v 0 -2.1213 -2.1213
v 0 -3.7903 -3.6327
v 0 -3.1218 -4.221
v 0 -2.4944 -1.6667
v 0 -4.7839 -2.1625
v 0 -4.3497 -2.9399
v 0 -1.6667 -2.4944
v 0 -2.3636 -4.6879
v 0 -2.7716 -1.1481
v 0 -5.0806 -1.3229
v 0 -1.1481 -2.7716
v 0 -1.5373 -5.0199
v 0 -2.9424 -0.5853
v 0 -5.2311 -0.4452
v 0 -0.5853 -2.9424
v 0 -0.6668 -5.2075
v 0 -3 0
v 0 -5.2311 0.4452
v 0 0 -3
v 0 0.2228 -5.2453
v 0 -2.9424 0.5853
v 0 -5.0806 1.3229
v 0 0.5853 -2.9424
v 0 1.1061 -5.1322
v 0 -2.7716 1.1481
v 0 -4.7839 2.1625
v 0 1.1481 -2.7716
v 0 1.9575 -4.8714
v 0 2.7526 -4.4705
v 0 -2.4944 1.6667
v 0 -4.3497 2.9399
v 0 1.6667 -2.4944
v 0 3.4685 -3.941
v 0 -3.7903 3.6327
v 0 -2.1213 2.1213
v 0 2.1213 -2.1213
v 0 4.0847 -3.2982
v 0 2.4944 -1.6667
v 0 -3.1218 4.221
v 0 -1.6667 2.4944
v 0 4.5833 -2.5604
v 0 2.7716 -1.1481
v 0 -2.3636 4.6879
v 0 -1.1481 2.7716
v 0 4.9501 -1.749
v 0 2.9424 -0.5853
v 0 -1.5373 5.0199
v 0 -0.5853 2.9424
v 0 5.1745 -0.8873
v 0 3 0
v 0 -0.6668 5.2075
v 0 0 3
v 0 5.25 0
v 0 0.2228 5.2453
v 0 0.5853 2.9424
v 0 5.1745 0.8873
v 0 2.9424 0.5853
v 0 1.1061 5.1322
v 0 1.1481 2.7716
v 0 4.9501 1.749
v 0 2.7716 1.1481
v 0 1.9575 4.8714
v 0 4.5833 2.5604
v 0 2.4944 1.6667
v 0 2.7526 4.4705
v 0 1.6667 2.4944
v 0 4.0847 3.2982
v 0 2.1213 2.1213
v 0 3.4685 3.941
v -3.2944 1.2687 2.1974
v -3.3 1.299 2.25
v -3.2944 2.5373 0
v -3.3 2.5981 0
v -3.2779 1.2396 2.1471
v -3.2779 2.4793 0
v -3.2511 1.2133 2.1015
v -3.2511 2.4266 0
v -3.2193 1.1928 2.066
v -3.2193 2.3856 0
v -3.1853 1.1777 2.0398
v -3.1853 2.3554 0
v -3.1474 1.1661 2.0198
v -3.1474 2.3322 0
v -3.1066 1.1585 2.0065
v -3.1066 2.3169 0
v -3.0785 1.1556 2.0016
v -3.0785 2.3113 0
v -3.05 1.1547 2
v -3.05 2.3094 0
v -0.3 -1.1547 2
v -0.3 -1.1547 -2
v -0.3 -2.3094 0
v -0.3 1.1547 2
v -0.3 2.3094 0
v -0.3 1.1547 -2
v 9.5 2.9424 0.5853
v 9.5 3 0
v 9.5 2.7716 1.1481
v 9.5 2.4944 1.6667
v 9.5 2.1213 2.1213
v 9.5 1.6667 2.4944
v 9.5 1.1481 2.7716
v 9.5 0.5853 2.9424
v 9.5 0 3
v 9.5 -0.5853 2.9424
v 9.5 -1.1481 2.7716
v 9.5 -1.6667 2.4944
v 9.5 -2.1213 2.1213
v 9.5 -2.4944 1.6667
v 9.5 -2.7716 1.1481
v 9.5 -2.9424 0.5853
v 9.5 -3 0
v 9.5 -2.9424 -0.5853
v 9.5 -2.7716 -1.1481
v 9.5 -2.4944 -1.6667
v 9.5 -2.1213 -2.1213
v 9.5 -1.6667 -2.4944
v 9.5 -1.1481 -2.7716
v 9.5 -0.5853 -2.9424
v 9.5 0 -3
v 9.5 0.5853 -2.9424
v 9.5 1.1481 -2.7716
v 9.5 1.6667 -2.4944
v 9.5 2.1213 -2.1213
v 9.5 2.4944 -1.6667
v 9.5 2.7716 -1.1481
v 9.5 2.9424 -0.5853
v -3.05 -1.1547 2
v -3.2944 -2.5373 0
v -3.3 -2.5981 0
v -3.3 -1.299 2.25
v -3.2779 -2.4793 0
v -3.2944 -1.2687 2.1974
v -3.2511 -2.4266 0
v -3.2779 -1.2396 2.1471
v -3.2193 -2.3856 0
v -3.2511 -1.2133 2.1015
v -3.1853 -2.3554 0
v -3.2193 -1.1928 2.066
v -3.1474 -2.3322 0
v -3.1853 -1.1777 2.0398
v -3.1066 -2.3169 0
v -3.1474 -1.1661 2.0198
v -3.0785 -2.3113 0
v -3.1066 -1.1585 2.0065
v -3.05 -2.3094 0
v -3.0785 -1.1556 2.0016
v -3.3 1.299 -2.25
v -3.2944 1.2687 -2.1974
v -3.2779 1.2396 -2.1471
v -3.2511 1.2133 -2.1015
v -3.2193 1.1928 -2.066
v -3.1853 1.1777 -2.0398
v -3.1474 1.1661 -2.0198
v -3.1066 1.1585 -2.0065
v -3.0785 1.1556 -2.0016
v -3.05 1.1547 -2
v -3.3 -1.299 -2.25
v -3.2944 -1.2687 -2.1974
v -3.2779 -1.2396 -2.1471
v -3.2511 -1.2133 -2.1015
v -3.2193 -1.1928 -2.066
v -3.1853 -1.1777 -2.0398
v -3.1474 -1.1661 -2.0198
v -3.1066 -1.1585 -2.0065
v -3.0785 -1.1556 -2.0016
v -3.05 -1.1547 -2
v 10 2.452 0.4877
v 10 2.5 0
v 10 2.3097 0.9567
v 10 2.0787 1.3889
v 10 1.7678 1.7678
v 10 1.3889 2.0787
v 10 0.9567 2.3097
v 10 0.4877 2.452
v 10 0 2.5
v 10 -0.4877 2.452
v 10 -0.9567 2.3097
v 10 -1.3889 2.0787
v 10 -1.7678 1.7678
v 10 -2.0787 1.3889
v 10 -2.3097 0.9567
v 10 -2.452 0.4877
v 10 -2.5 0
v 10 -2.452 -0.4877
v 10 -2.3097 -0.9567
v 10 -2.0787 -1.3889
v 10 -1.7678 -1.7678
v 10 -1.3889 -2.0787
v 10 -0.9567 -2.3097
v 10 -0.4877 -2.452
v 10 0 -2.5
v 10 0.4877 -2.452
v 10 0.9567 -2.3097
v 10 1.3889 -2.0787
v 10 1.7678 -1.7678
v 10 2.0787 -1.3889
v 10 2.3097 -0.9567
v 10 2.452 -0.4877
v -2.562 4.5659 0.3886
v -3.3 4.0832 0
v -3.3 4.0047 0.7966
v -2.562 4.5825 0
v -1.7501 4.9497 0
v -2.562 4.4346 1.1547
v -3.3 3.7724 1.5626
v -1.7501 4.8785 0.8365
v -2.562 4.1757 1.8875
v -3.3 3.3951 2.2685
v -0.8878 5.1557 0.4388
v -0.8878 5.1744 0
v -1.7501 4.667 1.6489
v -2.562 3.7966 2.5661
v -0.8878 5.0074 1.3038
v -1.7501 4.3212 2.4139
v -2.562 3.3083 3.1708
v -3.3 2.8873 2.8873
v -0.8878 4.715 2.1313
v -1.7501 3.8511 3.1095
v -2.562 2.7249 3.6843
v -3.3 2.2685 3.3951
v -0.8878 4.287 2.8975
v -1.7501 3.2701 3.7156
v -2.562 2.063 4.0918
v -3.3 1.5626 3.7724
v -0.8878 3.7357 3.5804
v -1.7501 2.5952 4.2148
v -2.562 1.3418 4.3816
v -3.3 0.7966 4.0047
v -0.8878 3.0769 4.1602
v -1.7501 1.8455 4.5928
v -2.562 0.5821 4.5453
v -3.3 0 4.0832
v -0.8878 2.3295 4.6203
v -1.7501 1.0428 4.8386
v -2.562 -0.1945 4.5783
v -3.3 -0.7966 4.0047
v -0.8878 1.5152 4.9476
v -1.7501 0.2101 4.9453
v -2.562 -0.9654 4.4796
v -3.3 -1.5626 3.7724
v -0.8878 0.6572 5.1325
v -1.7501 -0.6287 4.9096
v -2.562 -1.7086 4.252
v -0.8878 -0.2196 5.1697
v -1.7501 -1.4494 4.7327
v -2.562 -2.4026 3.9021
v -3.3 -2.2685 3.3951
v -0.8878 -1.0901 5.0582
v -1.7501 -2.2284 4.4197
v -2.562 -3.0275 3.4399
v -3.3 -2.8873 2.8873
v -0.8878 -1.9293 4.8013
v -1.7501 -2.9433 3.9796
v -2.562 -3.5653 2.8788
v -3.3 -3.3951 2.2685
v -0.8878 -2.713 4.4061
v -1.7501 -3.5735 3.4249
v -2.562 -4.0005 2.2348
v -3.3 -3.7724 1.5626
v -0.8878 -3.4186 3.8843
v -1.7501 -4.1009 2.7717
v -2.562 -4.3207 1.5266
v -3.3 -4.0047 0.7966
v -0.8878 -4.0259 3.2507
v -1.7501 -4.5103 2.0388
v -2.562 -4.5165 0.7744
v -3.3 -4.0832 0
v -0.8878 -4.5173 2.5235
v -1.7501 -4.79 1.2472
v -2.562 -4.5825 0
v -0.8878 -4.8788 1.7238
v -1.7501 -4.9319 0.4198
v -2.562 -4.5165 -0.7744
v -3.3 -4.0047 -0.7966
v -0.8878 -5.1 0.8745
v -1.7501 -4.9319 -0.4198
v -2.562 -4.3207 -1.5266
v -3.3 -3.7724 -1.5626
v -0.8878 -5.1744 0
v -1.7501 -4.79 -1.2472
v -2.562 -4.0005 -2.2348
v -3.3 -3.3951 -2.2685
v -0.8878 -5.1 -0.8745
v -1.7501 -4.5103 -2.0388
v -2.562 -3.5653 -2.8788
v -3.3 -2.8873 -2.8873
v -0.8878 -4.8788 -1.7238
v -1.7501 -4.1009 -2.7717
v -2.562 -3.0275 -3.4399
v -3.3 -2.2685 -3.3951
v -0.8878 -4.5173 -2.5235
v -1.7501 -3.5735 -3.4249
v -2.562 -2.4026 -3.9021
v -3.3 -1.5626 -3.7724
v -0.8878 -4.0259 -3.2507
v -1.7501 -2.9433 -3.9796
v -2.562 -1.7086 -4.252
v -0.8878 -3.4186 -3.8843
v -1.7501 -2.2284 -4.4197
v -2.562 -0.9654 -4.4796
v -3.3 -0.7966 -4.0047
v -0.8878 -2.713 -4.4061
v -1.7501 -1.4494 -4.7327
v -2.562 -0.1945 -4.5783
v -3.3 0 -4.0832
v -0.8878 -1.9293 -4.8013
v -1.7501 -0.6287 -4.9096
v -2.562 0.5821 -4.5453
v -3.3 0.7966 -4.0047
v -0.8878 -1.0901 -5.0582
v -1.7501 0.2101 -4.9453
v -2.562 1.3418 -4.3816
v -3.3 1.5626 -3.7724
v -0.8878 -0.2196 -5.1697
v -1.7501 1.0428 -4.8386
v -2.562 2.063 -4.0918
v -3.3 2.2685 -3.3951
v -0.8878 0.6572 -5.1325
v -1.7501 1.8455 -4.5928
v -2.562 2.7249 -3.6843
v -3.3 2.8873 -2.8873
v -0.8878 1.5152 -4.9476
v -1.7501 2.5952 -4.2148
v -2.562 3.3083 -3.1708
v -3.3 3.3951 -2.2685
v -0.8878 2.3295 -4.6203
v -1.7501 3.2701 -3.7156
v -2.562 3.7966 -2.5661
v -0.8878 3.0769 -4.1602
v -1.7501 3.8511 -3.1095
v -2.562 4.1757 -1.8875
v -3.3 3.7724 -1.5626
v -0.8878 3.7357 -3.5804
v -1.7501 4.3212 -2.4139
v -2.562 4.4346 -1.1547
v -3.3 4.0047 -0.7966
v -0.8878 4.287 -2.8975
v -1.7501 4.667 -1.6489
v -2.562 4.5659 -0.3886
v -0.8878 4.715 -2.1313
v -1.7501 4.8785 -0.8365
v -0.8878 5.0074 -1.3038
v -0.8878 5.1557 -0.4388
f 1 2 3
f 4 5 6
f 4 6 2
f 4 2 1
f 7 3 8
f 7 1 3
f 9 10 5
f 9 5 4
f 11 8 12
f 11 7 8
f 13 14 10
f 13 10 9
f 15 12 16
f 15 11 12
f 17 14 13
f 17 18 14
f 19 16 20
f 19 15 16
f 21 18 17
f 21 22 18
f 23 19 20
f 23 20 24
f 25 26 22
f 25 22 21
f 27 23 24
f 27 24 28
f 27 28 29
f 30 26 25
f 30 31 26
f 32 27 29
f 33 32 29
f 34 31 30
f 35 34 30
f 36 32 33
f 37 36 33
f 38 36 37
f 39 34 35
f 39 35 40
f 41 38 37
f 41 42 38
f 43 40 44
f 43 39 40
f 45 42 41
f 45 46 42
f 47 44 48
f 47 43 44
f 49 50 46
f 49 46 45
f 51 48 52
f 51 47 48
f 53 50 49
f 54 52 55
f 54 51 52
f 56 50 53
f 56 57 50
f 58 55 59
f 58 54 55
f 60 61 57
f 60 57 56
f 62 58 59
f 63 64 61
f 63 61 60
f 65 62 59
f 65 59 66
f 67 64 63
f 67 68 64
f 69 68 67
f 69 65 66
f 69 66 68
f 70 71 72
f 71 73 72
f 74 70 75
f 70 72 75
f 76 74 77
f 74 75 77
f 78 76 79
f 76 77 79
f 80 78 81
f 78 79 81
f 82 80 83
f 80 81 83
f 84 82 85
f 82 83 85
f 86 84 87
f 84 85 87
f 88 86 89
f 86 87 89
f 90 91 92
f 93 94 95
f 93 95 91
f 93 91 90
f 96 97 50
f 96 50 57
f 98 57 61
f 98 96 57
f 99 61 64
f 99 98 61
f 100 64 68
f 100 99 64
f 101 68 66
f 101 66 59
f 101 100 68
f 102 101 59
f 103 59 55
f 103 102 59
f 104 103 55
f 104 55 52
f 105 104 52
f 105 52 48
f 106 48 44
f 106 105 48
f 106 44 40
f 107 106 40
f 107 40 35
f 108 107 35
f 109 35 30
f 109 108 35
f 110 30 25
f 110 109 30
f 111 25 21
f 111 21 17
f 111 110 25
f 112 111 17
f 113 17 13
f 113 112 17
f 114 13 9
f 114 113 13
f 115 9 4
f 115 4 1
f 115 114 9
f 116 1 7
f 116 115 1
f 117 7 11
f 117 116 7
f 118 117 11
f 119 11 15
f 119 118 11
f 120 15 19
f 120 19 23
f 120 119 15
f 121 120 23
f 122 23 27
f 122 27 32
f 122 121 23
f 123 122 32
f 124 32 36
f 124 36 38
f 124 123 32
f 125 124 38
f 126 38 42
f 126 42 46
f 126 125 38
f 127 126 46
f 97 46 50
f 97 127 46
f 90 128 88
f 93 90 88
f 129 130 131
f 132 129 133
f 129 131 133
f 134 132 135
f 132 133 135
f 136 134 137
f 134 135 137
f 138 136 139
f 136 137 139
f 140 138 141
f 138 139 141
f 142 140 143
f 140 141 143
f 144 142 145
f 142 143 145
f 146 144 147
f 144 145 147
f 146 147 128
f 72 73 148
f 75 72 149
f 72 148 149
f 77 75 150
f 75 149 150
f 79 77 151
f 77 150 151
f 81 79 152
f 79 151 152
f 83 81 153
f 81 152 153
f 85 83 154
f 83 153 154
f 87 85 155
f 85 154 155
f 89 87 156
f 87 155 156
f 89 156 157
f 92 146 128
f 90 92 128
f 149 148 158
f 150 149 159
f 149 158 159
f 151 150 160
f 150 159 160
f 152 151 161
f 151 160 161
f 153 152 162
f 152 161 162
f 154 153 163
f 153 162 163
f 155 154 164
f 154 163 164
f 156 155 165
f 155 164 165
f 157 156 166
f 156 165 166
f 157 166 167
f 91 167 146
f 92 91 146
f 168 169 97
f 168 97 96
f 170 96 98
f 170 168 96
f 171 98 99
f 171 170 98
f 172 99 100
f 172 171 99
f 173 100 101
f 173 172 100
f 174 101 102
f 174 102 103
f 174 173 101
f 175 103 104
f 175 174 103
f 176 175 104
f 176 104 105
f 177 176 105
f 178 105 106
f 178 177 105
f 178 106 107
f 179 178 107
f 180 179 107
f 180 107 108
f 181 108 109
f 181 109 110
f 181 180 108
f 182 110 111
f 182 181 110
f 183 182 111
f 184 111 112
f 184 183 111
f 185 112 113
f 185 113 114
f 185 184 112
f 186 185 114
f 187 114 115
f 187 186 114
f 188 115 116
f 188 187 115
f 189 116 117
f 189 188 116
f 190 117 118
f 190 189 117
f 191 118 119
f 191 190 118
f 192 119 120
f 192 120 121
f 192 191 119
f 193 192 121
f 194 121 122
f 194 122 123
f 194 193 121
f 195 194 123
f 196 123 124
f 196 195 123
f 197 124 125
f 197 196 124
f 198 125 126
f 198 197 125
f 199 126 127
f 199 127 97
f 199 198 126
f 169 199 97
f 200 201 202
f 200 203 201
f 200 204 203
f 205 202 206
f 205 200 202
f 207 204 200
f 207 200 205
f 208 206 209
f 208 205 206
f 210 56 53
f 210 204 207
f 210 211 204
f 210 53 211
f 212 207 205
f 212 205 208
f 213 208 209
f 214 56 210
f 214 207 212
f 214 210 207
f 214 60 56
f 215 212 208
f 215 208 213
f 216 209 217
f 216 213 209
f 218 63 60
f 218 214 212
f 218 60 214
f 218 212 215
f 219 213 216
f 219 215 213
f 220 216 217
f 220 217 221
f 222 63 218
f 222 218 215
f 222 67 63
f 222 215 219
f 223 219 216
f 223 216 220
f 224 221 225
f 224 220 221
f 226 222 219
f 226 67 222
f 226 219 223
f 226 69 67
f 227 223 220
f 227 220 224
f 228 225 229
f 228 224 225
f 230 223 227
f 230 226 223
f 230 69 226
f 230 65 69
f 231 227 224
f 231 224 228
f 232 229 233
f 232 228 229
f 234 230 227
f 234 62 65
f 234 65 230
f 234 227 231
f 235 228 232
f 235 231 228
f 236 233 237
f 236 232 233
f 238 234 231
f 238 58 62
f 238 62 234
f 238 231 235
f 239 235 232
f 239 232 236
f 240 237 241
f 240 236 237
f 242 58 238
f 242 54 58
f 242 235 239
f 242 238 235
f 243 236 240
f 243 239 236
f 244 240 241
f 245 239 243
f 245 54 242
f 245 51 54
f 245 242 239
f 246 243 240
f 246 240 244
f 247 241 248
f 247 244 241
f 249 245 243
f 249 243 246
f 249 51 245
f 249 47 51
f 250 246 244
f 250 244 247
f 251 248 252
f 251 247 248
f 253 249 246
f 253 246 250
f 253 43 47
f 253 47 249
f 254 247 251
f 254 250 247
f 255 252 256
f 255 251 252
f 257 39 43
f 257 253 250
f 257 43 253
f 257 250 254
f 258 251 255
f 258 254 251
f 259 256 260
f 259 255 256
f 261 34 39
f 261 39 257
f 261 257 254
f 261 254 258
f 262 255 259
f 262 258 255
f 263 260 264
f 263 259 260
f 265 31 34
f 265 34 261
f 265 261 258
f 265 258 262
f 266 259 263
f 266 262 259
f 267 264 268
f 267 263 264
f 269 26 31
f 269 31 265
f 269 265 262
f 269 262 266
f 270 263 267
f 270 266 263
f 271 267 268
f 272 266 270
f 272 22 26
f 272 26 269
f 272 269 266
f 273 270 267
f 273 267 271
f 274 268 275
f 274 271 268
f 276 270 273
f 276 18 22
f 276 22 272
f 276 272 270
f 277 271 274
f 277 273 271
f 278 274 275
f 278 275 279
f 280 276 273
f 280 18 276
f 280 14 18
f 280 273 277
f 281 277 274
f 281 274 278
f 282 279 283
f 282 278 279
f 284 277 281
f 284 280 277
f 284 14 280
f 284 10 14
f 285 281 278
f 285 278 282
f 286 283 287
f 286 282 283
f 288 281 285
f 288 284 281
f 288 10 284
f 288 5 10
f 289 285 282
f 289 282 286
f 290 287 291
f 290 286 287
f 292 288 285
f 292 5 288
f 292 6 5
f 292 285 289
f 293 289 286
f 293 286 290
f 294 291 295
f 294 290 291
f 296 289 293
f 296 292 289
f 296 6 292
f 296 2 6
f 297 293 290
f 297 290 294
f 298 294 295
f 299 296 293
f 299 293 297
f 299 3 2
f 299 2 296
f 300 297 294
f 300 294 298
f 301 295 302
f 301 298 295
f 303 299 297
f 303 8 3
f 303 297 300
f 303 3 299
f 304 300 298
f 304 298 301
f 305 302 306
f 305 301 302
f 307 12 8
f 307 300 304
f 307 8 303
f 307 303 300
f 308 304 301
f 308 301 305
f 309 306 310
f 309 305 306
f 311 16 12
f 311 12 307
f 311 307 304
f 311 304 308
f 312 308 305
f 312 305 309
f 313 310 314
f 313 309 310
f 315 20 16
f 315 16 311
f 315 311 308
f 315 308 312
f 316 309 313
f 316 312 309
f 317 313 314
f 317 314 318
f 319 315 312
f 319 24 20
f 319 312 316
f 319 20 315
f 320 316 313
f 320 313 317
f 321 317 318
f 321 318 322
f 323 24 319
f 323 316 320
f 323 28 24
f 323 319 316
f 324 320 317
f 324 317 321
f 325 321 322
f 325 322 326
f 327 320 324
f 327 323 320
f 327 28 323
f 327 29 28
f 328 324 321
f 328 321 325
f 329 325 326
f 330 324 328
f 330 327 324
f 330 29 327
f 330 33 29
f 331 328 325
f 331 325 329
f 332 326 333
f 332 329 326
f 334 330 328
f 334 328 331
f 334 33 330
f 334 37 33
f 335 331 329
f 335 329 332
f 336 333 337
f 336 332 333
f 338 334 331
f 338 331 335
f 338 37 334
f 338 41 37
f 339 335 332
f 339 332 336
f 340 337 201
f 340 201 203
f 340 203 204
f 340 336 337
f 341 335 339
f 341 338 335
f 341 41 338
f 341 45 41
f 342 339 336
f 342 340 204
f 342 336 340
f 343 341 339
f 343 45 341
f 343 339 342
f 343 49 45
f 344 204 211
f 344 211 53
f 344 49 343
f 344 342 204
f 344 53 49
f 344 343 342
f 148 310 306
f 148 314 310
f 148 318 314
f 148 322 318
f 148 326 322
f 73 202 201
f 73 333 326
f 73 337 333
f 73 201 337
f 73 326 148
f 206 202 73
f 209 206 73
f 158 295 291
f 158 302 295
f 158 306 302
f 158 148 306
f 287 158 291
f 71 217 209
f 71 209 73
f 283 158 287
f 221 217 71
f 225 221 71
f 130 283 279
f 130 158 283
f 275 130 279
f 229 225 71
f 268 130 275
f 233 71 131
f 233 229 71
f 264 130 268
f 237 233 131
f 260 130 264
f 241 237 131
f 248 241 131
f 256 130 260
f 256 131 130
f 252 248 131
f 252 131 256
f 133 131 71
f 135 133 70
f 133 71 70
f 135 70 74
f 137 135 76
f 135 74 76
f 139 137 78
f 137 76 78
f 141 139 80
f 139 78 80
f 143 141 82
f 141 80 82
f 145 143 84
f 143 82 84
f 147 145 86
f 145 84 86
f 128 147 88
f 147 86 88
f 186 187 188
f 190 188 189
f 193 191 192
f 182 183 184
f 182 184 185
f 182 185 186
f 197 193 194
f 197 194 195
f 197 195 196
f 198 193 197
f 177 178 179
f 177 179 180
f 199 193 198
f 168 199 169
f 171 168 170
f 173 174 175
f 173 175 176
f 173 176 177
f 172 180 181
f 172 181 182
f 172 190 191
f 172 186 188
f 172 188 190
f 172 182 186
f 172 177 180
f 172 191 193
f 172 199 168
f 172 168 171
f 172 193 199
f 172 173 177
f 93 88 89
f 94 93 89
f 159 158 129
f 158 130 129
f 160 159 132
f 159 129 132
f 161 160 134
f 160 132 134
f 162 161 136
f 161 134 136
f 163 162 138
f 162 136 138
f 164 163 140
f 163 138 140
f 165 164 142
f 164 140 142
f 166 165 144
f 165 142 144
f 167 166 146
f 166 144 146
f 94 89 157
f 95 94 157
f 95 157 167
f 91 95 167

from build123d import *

# Parameters (mm, degrees)
CUT_EXTRUDE_1_DEPTH = 3
FILLET_1_R          = 0.25
CHAMFER_1_SIZE      = 0.5


with BuildPart() as part:
    # Эскиз1 → Повернуть1 (revolve)
    with BuildSketch(Plane.XY):
        with BuildLine():
            Line((0, 5.25), (0, 3))
            Line((0, 3), (10, 3))
            Line((10, 3), (10, 0))
            Line((10, 0), (-3.3, 0))
            Line((-3.3, 0), (-3.3, 4.083197277))
            ThreePointArc((-3.3, 4.083197277), (-1.75010204, 4.949711391), (0, 5.25))
        make_face()
    revolve(axis=Axis((-165.749374514, 0, 0), (1, 0, 0)))

    # Эскиз2 → Вырез-Вытянуть1 (cut)
    with BuildSketch(Plane.ZY.offset(3.3)):
        Polygon((0, -2.309401077), (2, -1.154700538), (2, 1.154700538), (0, 2.309401077), (-2, 1.154700538), (-2, -1.154700538), align=None)
    extrude(amount=-CUT_EXTRUDE_1_DEPTH, mode=Mode.SUBTRACT)

    # Скругление1
    fillet_1_edges = [part.edges().sort_by_distance(p)[0] for p in [
        (-3.3, -1.732050808, -1),
        (-3.3, -1.732050808, 1),
        (-3.3, 0, 2),
        (-3.3, 1.732050808, 1),
        (-3.3, 1.732050808, -1),
        (-3.3, 0, -2),
    ]]
    fillet(fillet_1_edges, radius=FILLET_1_R)

    # Фаска1
    chamfer_1_edges = [part.edges().sort_by_distance(p)[0] for p in [
        (10, -3, 0),
    ]]
    chamfer(chamfer_1_edges, length=CHAMFER_1_SIZE)


solid = part.part
